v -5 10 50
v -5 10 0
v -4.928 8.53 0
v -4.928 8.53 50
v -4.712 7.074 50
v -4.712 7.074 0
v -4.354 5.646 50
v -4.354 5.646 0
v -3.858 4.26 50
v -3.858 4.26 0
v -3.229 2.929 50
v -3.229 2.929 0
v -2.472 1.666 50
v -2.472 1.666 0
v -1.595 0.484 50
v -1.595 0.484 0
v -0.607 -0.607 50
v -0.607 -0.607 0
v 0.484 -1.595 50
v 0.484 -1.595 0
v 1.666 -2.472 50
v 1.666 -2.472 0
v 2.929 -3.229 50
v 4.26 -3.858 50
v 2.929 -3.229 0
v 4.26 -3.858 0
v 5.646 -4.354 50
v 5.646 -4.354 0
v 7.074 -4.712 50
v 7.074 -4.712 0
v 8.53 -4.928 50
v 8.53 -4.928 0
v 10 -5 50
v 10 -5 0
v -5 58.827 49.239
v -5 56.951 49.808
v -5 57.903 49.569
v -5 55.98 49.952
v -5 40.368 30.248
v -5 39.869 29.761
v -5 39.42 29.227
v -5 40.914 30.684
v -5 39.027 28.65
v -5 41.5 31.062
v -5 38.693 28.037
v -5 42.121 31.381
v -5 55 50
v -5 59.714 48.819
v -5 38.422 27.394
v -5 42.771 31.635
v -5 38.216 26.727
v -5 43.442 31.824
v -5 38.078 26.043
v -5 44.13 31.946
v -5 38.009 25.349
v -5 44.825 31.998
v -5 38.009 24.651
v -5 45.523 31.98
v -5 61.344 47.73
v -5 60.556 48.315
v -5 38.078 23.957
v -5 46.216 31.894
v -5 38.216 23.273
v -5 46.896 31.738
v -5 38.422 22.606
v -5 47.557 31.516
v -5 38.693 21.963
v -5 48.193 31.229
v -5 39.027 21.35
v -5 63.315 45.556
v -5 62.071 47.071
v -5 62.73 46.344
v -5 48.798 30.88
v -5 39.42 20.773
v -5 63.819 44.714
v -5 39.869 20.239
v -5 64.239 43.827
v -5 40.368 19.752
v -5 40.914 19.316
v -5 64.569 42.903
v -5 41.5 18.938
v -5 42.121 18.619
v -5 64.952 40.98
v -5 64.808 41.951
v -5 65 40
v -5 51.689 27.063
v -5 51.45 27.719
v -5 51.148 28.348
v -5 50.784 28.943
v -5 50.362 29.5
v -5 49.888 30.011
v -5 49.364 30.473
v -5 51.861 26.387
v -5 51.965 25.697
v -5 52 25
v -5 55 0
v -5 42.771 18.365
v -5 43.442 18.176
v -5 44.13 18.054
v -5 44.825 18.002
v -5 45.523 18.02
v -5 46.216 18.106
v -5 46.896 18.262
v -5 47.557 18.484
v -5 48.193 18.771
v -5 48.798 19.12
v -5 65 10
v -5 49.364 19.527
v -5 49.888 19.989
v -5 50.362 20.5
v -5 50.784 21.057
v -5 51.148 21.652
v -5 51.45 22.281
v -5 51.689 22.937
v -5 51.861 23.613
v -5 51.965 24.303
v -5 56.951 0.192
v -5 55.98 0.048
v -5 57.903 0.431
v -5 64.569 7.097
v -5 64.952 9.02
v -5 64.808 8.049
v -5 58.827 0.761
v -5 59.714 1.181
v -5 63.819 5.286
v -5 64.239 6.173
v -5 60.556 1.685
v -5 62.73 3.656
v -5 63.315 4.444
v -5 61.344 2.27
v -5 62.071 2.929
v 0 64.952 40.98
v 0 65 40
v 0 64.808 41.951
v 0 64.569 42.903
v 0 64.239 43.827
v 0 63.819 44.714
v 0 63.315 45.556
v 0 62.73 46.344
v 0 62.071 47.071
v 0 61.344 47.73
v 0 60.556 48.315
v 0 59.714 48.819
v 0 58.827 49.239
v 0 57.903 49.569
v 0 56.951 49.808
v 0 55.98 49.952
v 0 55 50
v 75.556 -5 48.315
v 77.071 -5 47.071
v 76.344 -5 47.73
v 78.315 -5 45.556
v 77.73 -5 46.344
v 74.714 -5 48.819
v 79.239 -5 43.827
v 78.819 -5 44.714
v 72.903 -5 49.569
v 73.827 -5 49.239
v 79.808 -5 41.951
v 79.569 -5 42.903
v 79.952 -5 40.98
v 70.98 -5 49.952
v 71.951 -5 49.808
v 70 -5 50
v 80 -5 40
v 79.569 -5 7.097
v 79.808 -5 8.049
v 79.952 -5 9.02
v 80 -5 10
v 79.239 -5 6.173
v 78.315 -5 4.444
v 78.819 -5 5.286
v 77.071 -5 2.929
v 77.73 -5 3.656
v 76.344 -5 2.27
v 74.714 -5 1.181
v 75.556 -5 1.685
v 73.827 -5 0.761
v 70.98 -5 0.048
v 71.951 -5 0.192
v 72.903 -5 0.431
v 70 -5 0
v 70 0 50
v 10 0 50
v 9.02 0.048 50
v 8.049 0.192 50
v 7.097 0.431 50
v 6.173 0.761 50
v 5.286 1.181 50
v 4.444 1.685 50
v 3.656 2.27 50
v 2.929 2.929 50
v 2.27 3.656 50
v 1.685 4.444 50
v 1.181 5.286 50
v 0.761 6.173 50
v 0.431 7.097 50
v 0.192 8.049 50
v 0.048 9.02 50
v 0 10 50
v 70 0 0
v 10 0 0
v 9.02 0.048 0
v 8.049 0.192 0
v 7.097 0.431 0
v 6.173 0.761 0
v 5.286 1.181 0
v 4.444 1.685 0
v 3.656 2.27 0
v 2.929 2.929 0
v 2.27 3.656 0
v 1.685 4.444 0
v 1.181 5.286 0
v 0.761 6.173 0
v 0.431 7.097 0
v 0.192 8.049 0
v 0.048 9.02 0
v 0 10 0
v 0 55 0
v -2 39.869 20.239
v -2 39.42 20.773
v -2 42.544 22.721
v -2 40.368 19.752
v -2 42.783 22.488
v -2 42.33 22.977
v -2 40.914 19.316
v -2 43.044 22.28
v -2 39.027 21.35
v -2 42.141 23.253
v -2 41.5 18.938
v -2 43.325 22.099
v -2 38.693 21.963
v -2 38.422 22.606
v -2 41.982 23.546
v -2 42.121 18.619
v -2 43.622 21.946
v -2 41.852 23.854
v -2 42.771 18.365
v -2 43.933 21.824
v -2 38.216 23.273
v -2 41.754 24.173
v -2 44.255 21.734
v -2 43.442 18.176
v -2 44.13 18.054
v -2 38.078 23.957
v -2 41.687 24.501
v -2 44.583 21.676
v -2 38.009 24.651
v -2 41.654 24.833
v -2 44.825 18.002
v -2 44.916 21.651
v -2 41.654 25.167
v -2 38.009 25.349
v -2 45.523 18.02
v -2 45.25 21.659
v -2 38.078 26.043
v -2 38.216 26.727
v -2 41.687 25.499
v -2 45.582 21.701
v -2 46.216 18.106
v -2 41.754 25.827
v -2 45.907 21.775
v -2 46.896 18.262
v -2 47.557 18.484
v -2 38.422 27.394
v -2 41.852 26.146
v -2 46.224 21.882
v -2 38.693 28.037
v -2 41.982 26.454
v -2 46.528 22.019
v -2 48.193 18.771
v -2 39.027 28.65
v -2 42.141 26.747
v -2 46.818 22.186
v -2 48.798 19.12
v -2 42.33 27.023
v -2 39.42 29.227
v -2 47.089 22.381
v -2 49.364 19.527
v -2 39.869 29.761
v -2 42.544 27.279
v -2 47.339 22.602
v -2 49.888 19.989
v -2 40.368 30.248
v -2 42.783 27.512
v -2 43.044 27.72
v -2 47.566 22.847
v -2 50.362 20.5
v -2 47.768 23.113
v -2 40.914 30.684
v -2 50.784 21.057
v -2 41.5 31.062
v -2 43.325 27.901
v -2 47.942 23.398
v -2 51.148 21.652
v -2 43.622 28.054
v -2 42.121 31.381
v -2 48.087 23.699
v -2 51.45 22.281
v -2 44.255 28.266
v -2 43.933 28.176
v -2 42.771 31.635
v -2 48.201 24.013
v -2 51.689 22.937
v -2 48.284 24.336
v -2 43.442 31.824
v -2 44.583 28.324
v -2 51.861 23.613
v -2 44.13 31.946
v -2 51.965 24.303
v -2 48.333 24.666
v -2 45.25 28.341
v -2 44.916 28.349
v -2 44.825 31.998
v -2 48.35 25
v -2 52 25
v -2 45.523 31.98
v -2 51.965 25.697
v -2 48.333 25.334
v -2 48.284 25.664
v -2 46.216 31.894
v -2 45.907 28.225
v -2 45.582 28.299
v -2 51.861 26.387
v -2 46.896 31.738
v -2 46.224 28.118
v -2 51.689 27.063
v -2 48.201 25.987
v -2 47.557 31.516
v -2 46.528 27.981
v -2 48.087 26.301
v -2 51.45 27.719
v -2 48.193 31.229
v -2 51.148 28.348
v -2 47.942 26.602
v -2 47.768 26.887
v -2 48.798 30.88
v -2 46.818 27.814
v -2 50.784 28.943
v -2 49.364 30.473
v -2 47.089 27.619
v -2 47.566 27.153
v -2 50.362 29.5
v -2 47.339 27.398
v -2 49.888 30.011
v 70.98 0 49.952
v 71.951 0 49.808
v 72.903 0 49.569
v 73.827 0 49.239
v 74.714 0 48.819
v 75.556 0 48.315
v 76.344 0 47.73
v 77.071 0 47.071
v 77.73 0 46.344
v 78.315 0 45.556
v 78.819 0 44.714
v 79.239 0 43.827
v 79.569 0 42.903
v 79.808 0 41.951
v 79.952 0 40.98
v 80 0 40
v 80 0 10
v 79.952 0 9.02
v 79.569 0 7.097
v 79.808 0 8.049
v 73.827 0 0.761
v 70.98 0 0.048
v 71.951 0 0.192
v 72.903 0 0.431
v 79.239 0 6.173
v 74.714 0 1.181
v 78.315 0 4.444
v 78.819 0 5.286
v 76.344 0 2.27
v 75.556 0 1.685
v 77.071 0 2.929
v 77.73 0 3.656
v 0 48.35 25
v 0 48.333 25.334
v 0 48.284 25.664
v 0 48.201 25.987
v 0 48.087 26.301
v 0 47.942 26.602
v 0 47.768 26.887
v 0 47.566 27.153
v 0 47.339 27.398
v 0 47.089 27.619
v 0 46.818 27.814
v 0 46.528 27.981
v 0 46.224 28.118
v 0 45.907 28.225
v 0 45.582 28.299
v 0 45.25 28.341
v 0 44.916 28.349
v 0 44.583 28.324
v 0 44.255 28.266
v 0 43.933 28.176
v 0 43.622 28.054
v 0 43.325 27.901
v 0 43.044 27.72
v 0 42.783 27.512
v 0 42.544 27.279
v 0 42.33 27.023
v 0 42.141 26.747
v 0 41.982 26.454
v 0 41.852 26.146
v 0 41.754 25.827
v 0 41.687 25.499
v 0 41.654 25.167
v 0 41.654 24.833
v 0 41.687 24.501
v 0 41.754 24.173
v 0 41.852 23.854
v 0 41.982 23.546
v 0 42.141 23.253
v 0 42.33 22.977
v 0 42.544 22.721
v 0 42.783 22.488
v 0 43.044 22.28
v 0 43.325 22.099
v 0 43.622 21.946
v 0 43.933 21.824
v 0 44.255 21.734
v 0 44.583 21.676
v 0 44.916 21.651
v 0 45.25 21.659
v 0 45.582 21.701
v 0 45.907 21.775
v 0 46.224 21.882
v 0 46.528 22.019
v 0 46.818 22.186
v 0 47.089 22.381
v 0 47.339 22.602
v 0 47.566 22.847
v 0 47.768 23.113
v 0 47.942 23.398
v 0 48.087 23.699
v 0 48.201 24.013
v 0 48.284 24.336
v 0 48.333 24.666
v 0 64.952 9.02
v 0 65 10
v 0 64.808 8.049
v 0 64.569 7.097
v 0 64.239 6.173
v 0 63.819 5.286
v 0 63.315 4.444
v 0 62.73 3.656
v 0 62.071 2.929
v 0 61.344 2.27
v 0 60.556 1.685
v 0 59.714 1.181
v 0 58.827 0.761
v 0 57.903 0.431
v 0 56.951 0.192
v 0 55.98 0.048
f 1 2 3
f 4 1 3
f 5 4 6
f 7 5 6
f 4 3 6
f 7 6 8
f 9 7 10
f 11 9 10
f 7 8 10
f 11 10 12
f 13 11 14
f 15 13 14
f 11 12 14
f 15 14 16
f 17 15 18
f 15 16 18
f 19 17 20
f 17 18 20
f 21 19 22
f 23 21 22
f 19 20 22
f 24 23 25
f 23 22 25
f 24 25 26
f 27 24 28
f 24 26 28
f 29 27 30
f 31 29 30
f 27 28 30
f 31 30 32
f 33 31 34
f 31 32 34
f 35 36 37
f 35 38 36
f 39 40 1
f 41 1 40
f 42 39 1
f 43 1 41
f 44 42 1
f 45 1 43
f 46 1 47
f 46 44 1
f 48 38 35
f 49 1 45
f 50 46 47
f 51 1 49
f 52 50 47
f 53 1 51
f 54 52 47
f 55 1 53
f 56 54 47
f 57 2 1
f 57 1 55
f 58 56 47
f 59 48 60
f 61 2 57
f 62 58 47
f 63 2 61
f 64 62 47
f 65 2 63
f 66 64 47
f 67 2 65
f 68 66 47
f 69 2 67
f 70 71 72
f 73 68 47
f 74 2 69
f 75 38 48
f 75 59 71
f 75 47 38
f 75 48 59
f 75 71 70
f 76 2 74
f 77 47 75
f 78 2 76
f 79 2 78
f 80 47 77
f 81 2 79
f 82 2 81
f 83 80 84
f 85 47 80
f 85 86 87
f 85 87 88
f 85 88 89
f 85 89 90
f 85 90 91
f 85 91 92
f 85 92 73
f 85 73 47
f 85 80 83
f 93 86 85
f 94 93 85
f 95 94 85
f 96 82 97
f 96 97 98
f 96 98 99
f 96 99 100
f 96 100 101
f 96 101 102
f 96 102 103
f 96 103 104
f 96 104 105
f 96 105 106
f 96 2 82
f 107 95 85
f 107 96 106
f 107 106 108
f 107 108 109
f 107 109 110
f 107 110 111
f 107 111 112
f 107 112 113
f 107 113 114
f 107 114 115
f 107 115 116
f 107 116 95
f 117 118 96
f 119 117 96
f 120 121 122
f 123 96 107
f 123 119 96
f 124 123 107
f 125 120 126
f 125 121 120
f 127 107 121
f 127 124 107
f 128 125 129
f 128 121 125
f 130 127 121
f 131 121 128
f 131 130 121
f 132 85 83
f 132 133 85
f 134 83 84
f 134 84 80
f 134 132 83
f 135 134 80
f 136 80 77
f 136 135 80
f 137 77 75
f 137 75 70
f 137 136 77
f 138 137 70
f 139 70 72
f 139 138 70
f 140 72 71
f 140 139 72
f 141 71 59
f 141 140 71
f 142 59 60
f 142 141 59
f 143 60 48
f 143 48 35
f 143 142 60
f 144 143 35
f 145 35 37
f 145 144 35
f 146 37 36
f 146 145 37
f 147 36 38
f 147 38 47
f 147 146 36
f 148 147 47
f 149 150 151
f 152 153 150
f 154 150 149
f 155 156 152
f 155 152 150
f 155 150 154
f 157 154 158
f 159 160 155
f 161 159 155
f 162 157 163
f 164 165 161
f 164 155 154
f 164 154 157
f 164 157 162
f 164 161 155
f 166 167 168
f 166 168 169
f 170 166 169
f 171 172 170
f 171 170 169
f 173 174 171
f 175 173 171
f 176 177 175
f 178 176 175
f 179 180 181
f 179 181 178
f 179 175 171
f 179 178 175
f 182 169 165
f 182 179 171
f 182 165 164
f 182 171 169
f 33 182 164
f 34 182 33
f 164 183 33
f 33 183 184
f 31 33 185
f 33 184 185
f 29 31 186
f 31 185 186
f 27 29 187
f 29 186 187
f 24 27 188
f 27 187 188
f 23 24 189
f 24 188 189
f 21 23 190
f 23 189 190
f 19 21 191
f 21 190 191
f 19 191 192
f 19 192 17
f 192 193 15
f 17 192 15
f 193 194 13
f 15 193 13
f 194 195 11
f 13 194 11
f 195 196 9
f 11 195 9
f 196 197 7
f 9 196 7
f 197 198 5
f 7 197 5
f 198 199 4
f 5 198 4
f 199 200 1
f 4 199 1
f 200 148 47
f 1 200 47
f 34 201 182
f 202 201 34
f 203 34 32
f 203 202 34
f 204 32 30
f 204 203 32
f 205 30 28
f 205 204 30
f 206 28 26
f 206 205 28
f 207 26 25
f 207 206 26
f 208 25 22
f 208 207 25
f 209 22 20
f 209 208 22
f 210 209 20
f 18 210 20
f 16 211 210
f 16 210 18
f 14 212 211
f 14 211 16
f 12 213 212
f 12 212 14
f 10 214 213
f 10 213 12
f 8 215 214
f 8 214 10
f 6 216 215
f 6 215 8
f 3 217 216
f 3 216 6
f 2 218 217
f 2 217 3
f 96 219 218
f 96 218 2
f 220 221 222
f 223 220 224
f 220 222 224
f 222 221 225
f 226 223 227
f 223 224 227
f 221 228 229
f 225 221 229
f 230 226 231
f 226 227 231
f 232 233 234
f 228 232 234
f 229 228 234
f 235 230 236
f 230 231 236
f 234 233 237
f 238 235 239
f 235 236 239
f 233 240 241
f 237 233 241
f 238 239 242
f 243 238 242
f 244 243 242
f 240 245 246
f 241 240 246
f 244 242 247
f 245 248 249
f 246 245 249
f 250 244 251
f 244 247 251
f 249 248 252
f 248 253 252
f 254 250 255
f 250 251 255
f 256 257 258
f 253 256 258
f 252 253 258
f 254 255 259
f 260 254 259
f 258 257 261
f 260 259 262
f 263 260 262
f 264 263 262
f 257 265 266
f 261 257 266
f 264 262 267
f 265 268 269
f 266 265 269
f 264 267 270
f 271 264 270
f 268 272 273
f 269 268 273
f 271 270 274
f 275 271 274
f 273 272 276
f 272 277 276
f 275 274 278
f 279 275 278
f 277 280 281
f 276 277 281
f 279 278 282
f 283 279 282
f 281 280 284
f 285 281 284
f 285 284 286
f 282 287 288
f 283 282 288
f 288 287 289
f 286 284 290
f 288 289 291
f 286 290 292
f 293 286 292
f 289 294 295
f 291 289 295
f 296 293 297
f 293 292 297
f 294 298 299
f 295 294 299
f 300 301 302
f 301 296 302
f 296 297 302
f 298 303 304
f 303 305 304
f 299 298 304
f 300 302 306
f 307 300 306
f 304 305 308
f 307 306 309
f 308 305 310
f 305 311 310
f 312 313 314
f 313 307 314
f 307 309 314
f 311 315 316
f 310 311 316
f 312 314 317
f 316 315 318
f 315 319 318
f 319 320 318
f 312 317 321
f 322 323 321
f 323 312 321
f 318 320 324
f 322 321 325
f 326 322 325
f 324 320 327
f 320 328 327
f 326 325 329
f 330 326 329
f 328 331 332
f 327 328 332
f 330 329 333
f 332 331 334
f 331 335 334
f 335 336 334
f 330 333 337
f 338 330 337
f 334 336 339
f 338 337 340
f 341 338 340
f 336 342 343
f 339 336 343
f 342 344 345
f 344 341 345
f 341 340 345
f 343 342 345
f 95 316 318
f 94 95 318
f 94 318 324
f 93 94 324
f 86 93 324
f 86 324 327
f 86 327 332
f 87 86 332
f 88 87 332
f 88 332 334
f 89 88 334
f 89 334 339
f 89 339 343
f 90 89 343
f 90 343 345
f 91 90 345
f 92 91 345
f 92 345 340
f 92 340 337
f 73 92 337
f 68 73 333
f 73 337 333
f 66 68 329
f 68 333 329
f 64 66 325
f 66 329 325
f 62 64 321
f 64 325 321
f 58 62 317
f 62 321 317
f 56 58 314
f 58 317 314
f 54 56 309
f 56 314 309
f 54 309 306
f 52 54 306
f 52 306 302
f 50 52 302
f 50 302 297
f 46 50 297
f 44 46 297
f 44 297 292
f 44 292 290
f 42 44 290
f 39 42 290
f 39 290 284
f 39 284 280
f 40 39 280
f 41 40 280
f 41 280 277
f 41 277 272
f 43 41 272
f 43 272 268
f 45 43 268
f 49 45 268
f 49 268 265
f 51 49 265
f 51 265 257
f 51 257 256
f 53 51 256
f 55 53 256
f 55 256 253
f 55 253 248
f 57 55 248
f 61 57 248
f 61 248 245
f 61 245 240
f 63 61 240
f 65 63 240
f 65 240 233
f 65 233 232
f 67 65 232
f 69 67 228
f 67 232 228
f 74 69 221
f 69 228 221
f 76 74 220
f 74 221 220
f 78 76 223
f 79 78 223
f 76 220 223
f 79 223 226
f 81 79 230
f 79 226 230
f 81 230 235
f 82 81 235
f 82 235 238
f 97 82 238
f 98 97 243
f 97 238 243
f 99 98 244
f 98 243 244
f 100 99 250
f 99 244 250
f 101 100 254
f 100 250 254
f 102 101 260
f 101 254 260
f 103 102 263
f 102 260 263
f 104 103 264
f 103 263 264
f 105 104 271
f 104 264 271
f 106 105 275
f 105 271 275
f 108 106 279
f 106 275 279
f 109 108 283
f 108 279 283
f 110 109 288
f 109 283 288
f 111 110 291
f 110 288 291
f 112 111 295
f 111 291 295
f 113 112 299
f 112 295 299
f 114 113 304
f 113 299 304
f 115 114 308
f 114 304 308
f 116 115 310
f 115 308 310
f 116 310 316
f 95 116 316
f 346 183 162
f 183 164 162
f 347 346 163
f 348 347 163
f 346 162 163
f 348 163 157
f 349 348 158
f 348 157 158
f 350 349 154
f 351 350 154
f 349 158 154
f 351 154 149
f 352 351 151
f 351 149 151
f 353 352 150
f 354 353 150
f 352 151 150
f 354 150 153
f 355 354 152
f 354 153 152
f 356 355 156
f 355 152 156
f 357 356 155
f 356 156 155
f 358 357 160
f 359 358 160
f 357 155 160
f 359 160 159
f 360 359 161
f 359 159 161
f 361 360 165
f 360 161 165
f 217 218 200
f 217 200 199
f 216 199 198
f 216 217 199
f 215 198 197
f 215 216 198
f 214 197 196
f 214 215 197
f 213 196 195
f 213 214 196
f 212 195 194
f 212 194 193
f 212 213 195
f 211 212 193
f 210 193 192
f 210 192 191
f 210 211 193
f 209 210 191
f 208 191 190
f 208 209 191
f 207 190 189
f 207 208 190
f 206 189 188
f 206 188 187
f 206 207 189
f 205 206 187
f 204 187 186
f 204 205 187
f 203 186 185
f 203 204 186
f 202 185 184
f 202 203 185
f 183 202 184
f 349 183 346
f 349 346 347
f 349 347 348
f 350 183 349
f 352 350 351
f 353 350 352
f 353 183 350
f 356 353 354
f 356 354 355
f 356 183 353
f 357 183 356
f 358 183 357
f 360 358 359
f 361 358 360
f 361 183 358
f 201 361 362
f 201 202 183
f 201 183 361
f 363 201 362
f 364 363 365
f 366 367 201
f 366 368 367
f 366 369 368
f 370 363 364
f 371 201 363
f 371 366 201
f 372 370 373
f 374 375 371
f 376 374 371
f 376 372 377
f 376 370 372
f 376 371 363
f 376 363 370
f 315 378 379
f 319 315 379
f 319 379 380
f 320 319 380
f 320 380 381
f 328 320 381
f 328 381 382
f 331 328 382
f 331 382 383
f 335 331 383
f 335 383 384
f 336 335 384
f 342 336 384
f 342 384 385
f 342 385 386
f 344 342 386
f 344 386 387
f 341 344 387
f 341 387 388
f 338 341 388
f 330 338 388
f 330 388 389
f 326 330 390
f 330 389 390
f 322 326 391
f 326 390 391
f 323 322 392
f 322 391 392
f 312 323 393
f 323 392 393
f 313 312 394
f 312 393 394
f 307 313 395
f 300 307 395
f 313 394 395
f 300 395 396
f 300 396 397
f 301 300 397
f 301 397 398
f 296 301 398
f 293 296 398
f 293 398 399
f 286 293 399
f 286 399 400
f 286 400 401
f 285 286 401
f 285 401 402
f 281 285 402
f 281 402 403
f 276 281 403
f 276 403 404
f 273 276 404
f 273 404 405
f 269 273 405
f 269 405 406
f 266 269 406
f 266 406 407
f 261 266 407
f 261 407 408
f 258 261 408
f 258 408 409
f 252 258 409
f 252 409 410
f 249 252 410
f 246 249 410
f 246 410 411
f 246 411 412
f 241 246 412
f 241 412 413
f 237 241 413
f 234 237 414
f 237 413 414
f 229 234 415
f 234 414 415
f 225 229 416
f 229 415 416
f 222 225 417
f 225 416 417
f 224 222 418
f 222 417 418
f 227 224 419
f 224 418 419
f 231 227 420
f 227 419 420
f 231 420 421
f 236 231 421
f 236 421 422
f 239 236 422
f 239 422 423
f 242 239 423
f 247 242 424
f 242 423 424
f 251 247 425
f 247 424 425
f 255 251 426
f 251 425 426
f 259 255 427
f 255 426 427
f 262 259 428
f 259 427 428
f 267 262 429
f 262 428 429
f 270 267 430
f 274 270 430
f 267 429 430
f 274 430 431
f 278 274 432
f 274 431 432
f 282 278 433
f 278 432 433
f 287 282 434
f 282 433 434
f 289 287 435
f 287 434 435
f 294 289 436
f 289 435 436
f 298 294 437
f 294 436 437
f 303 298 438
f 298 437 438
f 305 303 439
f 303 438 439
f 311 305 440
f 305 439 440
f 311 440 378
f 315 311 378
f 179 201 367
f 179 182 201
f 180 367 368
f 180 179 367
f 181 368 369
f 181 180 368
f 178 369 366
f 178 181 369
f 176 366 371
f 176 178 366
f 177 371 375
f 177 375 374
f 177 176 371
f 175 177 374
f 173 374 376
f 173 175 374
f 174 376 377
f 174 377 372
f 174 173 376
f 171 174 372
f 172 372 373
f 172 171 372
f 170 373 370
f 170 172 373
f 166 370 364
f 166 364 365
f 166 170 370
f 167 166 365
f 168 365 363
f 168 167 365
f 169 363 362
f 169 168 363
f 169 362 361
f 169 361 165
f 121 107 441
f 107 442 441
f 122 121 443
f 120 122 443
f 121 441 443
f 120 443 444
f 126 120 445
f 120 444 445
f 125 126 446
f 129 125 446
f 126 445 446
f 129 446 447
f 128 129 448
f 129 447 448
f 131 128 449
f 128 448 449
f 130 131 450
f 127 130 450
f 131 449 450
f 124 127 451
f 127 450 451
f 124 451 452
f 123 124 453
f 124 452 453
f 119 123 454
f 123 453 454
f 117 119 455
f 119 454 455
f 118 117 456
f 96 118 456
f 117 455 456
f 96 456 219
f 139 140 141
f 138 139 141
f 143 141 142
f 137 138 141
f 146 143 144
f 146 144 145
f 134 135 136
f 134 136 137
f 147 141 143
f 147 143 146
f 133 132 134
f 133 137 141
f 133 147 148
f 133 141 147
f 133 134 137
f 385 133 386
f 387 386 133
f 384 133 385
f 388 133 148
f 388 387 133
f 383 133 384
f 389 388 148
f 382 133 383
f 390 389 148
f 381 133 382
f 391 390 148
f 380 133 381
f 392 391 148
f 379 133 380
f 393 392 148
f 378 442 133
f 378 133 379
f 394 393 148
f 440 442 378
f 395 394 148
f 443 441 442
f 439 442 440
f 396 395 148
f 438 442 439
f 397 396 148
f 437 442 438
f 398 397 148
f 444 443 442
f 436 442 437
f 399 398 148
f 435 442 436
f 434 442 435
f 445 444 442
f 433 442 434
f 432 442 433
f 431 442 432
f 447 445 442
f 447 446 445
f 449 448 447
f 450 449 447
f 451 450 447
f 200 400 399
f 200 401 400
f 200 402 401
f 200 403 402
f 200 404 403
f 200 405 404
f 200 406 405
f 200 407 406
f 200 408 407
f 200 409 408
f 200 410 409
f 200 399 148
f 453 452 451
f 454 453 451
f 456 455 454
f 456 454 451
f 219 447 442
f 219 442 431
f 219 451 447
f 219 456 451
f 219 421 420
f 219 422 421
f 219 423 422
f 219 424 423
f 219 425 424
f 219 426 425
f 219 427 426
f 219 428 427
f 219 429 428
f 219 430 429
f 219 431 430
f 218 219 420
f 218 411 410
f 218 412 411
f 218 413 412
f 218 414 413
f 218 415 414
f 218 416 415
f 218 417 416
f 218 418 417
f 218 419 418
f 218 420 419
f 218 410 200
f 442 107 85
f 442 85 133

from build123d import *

# Parameters (mm, degrees)
PAD_DEPTH       = 50
SKETCH001_R     = 3.35
POCKET_DEPTH    = 5.001
FILLET_R        = 10
SKETCH002_R     = 7
POCKET001_DEPTH = 3.001


with BuildPart() as part:
    # Sketch → Pad (new body)
    with BuildSketch(Plane.XY):
        with BuildLine():
            Line((0, 65), (0, 10))
            ThreePointArc((0, 10), (2.928932, 2.928932), (10, 0))
            Line((10, 0), (80, 0))
            Line((80, 0), (80, -5))
            Line((80, -5), (10, -5))
            ThreePointArc((-5, 10), (-0.606602, -0.606602), (10, -5))
            Line((-5, 10), (-5, 65))
            Line((-5, 65), (0, 65))
        make_face()
    extrude(amount=PAD_DEPTH)

    # Sketch001 → Pocket (cut, through all)
    with BuildSketch(Plane.YZ):
        with Locations((45, 25)):
            Circle(SKETCH001_R)
    extrude(amount=-POCKET_DEPTH, mode=Mode.SUBTRACT)

    # Fillet
    fillet_edges = [part.edges().sort_by_distance(p)[0] for p in [
        (-2.5, 65, 0),
        (-2.5, 65, 50),
        (80, -2.5, 50),
        (80, -2.5, 0),
    ]]
    fillet(fillet_edges, radius=FILLET_R)

    # Sketch002 → Pocket001 (cut, through all)
    with BuildSketch(Plane.YZ.offset(-2)):
        with Locations((45, 25)):
            Circle(SKETCH002_R)
    extrude(amount=-POCKET001_DEPTH, mode=Mode.SUBTRACT)


solid = part.part
